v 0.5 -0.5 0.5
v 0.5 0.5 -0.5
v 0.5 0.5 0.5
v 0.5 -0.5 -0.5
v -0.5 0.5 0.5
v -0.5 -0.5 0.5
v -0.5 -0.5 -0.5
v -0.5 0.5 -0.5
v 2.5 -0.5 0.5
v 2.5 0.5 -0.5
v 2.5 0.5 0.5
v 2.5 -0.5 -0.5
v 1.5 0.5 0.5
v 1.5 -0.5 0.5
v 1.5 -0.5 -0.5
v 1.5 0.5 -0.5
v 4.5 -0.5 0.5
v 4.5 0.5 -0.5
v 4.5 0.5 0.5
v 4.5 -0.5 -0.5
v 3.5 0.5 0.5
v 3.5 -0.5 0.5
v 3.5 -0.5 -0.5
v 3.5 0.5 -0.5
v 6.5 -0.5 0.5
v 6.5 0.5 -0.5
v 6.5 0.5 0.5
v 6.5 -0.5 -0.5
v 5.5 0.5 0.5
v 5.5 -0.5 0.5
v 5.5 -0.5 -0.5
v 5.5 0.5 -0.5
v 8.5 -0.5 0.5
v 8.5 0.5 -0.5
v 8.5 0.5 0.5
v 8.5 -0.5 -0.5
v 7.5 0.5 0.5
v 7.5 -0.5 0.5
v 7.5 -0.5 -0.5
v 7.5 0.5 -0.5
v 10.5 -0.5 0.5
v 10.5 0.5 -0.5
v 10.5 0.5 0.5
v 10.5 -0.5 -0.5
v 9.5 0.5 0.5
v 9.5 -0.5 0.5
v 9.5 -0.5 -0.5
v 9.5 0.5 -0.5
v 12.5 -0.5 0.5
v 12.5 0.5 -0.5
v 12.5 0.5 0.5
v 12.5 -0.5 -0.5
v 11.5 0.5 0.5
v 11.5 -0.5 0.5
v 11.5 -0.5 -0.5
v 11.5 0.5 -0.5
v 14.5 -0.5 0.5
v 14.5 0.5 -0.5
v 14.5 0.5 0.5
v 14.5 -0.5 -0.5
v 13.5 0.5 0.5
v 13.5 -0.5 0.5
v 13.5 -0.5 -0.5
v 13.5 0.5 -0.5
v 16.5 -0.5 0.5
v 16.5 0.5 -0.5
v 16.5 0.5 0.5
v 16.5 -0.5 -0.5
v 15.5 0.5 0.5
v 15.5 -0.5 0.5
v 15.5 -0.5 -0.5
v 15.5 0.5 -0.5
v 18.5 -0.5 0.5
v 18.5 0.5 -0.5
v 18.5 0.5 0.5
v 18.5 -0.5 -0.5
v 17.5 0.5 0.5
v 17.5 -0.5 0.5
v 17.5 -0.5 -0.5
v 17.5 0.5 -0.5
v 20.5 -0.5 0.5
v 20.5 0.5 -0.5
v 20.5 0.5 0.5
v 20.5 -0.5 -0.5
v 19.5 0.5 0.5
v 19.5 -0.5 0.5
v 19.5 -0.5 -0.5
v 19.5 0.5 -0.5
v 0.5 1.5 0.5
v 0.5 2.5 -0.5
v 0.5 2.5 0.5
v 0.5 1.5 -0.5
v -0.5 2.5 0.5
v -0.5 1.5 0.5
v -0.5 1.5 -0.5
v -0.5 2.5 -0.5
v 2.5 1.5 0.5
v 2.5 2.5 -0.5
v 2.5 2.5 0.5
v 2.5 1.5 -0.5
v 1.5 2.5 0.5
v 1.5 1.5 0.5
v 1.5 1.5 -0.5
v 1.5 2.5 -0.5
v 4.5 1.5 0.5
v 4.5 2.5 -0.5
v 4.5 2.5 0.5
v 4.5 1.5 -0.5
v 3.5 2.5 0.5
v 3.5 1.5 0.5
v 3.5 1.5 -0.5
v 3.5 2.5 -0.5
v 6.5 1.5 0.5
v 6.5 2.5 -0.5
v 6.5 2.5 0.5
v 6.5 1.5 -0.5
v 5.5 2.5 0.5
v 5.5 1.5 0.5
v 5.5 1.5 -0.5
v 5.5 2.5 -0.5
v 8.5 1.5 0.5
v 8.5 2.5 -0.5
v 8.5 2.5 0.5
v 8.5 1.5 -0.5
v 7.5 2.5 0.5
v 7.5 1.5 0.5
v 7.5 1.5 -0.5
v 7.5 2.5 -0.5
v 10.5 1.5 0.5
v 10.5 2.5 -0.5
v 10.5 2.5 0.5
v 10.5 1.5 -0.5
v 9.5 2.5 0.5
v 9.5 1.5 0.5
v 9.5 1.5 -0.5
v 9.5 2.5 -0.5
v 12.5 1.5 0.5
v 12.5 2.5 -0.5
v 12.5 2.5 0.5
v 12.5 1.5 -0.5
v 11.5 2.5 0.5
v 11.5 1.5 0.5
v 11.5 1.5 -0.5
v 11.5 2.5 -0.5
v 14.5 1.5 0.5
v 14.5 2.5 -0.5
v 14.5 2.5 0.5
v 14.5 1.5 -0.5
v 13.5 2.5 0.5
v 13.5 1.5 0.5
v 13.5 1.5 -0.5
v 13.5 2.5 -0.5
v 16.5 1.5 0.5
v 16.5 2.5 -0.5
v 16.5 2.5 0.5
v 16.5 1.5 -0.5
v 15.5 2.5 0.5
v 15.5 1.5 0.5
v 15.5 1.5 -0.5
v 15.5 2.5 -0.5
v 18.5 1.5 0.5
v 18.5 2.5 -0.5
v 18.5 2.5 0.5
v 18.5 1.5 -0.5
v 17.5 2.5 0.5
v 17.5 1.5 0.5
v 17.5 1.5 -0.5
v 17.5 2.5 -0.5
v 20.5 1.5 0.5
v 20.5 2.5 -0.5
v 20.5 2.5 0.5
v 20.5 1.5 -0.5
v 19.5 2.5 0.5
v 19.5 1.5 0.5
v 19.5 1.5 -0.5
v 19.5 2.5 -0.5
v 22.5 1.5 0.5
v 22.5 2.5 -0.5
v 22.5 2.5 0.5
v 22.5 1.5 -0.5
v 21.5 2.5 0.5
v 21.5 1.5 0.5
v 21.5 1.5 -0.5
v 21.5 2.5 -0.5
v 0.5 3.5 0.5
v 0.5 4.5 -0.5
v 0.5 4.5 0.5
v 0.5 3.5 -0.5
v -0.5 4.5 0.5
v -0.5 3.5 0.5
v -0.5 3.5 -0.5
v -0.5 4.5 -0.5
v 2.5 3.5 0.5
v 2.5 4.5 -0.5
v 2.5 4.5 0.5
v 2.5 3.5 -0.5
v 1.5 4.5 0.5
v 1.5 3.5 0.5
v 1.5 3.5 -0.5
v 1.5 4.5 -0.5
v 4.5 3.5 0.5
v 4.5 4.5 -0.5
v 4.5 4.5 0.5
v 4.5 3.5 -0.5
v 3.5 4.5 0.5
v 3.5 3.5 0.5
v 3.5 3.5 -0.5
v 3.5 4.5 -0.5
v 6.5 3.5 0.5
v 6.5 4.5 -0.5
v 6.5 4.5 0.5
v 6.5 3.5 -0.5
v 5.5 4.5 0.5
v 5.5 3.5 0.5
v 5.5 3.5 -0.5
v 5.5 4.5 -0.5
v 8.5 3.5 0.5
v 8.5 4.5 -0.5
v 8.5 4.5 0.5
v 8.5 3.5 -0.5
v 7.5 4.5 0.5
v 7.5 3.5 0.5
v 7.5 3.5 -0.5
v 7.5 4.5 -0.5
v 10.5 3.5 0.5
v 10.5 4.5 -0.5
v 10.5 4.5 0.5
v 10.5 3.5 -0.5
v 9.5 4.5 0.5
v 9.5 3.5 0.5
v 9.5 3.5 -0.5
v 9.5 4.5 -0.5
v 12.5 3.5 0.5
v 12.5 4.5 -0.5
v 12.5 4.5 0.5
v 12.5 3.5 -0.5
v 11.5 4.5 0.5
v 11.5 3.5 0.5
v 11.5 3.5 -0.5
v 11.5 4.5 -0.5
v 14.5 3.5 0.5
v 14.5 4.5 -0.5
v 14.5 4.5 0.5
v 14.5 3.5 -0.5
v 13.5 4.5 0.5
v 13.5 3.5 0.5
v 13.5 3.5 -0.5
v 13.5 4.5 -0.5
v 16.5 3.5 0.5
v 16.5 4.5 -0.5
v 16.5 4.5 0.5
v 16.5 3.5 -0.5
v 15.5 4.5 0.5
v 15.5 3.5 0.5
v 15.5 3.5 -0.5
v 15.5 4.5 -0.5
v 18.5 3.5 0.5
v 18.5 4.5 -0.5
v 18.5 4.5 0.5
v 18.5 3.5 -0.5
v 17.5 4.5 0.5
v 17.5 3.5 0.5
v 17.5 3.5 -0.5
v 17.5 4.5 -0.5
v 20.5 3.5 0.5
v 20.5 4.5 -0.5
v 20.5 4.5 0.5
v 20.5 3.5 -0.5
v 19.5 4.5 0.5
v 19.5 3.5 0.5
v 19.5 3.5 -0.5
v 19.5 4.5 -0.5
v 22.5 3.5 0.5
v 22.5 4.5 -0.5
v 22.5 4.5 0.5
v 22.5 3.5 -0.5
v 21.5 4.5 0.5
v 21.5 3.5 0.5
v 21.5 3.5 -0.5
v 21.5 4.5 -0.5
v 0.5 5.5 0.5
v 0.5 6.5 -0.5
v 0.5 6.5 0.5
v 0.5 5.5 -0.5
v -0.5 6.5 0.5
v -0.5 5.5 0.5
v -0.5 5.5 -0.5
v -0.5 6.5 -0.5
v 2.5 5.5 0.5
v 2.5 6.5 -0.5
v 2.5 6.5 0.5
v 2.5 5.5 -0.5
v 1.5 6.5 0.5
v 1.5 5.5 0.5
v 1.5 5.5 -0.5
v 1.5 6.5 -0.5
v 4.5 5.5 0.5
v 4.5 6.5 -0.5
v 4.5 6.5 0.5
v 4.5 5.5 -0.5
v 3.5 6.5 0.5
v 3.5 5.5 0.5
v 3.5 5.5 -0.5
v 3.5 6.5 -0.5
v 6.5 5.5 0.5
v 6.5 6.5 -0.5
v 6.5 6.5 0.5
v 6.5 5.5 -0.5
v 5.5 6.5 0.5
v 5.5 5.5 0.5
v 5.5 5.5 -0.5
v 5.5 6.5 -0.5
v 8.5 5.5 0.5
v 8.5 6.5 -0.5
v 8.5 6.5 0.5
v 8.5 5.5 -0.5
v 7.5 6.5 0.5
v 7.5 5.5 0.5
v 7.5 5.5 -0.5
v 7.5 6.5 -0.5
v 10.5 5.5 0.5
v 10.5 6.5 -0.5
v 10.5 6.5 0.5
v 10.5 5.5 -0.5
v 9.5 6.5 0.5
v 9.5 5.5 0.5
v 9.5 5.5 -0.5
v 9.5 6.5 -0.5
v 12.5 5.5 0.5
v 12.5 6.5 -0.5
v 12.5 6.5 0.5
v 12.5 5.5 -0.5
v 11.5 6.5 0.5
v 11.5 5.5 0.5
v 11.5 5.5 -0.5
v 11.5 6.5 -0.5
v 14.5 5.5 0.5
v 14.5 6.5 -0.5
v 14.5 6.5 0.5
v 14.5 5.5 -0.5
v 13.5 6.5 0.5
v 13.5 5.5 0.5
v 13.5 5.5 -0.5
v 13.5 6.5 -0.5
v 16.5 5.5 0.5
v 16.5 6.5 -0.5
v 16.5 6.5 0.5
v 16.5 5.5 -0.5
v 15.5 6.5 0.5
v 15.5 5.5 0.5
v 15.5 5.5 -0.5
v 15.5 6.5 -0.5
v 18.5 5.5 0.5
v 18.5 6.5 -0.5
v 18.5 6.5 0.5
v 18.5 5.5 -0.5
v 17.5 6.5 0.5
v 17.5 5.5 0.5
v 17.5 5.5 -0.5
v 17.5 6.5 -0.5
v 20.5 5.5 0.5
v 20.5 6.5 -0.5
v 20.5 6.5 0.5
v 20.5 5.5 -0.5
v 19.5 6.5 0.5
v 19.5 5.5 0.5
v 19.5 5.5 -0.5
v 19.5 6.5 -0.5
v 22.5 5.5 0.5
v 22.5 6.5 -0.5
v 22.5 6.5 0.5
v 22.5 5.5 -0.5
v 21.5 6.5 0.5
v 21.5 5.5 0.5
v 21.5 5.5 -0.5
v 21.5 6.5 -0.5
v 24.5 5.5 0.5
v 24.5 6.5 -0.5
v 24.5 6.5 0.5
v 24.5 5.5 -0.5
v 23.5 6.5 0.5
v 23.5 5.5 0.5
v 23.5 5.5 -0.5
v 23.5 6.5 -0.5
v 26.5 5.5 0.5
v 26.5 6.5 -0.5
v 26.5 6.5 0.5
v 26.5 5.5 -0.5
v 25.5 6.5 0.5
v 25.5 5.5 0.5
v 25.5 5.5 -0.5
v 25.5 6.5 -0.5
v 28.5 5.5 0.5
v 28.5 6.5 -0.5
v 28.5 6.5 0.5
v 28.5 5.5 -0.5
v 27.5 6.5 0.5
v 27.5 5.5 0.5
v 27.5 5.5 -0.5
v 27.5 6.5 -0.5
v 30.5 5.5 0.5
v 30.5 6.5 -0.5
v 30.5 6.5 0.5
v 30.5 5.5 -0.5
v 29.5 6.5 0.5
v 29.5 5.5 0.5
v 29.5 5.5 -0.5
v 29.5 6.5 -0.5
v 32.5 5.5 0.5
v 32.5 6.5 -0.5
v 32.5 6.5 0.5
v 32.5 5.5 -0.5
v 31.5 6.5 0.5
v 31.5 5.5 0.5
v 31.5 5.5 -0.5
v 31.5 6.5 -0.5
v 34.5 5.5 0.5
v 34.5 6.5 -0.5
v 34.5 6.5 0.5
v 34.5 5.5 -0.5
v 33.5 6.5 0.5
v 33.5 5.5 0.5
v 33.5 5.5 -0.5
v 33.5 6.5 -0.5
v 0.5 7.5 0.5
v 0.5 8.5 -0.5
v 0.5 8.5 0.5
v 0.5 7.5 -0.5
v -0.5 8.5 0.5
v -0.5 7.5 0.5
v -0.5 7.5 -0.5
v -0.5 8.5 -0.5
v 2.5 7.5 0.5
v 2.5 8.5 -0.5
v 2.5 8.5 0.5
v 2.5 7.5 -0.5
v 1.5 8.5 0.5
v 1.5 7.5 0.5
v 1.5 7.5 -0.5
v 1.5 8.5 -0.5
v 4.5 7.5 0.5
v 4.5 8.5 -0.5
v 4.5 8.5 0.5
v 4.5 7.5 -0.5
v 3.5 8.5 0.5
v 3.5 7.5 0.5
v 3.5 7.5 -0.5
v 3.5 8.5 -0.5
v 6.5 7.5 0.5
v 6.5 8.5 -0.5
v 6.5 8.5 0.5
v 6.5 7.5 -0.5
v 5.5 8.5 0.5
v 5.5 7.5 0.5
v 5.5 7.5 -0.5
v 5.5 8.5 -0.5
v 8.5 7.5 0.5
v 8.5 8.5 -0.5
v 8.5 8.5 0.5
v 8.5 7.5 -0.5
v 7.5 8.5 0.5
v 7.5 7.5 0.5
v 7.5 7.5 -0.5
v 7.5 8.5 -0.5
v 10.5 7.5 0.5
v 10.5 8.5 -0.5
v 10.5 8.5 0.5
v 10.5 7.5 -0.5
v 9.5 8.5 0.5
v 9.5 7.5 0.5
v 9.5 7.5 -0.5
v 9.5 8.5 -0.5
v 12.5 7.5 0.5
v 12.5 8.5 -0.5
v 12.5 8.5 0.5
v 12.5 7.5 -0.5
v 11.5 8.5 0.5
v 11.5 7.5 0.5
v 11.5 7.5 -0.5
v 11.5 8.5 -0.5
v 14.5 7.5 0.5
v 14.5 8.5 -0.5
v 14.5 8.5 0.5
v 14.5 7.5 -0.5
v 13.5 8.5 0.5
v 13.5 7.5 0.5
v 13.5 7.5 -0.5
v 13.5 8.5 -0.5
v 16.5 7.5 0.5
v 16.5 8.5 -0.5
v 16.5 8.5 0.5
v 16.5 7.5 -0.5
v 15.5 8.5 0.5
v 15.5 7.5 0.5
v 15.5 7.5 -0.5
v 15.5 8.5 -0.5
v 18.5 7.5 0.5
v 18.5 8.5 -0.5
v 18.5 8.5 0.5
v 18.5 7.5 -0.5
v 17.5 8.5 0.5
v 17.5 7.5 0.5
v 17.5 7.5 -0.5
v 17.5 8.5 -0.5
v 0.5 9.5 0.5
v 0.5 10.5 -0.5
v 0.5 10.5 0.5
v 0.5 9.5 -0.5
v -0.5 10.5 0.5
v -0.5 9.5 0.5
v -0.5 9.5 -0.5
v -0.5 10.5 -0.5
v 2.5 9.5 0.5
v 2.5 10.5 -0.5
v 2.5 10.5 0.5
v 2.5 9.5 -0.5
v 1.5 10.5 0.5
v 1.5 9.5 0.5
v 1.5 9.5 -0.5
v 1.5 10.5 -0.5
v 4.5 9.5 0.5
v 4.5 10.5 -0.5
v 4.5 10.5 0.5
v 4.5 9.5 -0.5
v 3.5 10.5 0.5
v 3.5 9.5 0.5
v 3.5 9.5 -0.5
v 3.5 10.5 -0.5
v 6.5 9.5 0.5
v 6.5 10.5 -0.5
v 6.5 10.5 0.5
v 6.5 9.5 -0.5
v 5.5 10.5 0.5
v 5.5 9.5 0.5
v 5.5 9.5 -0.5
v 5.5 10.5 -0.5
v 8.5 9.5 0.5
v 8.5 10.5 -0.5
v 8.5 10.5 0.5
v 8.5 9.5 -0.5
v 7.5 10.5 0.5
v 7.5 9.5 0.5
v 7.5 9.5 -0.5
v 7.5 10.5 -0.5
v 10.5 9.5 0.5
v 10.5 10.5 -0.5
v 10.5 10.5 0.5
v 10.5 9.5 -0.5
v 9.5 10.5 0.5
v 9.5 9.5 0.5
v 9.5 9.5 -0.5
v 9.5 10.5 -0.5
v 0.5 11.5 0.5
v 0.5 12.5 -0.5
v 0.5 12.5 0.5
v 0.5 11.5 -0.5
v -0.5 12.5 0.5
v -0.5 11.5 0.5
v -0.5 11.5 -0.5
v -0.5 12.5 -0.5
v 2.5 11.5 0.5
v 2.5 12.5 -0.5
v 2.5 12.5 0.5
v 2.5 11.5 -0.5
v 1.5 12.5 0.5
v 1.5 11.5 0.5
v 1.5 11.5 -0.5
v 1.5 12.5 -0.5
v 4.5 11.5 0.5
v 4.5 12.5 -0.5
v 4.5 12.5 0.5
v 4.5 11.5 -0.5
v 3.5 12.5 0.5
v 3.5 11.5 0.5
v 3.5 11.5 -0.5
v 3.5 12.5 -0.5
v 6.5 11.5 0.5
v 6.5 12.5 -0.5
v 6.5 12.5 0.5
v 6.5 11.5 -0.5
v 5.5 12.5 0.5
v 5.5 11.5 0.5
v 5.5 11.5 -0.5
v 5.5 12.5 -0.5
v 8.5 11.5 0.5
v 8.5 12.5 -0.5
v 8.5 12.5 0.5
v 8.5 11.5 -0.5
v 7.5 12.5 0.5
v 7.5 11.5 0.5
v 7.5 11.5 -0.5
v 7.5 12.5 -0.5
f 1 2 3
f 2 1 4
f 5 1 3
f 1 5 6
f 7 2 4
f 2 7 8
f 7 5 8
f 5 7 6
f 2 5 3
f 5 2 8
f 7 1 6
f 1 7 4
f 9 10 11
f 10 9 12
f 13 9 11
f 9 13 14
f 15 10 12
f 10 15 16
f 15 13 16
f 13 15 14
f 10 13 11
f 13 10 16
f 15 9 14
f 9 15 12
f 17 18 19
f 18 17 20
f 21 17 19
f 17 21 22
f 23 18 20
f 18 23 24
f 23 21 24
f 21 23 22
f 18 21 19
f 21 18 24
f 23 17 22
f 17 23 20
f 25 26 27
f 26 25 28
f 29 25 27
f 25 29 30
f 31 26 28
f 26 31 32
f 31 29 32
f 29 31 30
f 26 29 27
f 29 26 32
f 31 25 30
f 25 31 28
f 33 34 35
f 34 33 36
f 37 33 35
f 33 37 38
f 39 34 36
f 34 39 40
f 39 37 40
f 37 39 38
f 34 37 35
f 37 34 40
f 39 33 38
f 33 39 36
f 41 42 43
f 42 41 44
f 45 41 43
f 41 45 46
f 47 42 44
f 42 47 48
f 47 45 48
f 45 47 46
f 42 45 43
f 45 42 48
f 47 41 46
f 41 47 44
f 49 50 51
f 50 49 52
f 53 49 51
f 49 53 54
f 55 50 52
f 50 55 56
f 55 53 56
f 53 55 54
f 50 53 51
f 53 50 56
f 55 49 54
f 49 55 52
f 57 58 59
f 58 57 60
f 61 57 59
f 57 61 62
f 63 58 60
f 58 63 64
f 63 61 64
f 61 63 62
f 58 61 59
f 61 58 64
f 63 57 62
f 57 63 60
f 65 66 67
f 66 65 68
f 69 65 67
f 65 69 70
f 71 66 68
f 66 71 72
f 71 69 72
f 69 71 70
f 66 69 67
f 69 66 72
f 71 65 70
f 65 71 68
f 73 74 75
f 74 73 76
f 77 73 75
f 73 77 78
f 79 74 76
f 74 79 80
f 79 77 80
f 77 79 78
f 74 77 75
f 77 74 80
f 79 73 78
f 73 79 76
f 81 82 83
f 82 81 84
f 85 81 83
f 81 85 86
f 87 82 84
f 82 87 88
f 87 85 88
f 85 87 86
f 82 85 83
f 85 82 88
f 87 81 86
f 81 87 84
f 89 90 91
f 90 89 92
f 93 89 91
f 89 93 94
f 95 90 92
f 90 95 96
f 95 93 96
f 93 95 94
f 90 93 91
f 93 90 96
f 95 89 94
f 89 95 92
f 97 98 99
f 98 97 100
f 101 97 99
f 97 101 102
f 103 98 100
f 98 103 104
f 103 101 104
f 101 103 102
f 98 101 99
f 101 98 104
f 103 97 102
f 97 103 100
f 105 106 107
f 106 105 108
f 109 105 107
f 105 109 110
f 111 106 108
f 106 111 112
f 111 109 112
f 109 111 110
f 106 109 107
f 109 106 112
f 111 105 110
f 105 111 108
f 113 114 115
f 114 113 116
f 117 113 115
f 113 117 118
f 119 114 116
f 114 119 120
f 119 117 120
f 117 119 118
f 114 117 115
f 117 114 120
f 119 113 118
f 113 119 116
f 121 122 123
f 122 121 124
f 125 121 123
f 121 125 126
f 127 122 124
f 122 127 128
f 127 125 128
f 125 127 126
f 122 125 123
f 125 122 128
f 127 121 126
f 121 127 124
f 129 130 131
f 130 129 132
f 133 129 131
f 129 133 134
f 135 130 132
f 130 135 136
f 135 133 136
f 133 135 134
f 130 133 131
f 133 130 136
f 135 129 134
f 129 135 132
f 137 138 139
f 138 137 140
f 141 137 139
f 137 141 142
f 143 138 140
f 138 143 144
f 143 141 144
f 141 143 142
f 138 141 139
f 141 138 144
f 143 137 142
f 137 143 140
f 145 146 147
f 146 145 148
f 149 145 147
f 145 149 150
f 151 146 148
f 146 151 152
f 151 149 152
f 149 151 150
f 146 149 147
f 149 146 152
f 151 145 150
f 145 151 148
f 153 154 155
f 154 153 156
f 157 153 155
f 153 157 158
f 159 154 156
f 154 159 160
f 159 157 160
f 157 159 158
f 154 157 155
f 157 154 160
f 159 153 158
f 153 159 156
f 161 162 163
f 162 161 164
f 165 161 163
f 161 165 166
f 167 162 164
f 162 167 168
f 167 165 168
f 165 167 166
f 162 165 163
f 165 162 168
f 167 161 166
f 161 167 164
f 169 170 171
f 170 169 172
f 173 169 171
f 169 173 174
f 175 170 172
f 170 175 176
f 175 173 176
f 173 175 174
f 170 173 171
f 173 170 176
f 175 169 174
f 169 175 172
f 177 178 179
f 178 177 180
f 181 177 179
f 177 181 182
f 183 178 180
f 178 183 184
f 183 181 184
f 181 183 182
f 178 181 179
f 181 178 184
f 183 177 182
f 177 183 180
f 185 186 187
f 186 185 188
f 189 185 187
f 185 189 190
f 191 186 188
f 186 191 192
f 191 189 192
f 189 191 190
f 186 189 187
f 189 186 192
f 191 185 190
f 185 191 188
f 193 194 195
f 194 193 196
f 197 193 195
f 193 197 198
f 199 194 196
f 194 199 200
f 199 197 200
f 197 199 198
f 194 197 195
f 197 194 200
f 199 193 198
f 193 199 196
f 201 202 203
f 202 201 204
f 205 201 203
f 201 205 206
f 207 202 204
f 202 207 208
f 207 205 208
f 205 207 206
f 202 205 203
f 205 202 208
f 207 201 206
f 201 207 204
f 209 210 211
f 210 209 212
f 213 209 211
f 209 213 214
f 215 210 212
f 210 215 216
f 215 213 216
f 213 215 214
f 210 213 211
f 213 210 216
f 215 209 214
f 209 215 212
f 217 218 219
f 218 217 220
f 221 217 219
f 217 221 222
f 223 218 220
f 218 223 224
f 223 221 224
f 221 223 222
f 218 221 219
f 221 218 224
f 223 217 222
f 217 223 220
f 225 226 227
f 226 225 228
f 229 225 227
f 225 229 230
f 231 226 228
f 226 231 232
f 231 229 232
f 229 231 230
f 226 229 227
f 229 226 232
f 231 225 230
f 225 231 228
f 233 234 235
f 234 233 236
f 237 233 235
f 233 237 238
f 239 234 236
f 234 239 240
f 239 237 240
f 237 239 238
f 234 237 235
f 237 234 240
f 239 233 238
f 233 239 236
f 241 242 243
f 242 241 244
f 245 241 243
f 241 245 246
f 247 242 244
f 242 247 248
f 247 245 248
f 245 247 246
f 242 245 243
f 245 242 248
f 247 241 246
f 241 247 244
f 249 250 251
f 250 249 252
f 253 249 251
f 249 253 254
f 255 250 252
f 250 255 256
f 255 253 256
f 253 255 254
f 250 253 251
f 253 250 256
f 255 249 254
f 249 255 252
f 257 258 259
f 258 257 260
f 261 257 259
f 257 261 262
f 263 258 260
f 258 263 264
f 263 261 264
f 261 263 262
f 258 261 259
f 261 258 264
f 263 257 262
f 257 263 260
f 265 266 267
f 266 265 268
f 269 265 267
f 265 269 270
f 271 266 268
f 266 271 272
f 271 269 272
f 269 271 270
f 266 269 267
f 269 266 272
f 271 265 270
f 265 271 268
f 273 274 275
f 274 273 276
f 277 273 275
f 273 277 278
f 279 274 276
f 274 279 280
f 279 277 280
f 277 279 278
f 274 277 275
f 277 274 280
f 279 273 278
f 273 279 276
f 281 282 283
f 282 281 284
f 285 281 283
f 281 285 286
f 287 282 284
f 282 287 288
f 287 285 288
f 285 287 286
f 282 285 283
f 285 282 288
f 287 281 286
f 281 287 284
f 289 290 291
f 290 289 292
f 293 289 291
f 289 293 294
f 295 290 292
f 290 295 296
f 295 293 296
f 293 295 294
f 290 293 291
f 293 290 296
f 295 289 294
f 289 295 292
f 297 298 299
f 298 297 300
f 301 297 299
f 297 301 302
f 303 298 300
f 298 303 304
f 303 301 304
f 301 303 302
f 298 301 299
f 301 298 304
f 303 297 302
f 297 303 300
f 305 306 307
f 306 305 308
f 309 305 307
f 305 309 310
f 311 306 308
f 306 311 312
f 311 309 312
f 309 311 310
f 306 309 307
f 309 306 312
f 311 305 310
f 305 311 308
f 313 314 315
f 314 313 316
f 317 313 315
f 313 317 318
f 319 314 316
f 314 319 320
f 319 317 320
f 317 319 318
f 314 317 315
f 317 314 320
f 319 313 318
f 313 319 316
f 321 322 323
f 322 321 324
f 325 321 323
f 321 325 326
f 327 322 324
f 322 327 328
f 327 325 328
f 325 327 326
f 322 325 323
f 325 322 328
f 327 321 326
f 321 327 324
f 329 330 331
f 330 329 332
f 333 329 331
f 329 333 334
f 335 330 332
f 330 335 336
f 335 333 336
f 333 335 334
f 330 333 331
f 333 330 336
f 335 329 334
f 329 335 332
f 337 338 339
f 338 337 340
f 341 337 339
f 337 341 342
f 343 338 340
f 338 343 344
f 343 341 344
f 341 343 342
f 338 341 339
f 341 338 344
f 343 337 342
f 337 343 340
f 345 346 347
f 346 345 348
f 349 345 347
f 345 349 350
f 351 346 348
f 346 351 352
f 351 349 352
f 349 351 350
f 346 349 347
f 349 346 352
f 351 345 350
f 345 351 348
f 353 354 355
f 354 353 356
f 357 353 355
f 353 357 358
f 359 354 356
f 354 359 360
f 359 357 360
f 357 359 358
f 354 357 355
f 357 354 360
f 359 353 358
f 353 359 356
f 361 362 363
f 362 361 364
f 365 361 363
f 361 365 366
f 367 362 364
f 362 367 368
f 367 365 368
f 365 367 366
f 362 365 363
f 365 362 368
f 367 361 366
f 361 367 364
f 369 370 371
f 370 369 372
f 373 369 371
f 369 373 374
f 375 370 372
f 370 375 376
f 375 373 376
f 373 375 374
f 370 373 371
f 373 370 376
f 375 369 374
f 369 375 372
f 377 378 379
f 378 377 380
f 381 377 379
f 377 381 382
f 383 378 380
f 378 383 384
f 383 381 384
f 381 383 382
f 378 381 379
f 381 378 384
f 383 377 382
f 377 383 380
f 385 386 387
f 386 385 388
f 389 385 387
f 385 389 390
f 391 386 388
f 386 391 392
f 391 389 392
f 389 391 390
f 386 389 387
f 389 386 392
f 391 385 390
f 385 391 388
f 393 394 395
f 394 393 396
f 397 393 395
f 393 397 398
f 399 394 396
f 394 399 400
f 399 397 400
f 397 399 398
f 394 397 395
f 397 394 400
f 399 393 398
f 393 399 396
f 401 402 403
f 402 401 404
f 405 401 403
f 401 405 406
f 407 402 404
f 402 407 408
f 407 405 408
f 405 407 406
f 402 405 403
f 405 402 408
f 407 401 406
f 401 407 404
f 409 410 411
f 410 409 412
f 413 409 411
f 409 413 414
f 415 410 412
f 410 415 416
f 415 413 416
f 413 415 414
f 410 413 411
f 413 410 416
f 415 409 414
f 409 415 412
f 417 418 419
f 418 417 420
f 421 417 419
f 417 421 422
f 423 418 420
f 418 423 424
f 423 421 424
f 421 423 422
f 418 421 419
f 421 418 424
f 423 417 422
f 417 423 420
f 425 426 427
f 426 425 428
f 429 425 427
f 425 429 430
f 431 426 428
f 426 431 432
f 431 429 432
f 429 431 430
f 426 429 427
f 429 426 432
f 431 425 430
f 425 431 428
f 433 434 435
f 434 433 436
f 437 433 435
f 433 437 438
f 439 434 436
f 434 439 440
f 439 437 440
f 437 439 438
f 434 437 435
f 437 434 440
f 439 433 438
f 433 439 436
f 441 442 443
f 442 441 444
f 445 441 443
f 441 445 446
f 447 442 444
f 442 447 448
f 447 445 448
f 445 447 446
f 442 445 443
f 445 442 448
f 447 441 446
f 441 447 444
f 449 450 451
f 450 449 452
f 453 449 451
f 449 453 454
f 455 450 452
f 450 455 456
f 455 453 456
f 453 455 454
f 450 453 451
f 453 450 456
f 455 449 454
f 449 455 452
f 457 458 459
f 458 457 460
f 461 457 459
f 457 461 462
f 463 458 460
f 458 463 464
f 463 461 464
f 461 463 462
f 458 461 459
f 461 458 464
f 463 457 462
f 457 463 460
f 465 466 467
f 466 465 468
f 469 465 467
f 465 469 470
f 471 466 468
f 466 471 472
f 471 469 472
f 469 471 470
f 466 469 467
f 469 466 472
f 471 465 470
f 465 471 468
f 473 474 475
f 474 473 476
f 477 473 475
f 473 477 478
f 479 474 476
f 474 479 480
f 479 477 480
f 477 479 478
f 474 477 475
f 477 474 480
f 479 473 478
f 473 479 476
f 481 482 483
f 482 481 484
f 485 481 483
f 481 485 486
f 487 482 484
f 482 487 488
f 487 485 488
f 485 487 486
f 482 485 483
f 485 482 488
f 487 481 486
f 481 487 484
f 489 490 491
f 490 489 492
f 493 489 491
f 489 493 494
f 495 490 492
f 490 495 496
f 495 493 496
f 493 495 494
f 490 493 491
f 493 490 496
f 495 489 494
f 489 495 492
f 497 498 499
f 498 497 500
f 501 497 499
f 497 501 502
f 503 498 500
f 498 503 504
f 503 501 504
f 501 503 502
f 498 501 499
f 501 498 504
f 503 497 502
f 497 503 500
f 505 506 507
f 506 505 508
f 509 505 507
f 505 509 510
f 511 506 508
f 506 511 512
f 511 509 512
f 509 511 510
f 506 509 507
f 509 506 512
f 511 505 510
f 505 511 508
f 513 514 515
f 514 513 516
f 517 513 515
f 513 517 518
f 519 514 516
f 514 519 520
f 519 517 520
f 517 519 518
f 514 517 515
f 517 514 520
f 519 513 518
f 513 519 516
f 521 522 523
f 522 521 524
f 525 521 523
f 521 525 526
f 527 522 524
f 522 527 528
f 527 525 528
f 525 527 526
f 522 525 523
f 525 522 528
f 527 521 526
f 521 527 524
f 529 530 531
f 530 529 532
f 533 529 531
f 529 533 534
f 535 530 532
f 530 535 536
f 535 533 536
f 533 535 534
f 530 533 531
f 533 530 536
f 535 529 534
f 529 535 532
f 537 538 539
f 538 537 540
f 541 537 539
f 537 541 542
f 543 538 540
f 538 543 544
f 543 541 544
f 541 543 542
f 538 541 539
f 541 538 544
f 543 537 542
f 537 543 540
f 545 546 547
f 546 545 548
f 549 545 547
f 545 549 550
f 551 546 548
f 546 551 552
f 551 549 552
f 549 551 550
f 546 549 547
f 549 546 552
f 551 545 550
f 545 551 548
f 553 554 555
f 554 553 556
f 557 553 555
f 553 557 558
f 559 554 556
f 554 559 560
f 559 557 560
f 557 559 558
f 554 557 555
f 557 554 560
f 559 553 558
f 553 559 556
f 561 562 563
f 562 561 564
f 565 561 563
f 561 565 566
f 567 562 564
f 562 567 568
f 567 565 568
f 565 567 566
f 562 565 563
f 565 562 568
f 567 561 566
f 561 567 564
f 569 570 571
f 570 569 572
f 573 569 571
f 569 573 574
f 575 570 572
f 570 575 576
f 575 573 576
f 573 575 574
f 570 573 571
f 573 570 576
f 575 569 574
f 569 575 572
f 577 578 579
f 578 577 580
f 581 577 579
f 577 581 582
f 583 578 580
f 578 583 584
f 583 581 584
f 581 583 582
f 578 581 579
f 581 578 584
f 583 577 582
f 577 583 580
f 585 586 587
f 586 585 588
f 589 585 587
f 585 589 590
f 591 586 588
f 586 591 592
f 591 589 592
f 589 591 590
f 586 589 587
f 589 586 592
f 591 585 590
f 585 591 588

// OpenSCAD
// file: Generic-Constants-Lib.scad
// Generic Constants  Library 
// filename "Generic-Constants-Lib.scad" version 0.01a
//
// see openscad/libraries/SCAD/Generic-Lib-Main.scad for guidelines 
//
//
//constants included in this file 
//-------------------------------
//
//group math constants
//	INCH
//	PI  
//group colors
//	basic colors 
//	ABS_<color name>
//	PLA_<color name>
//	ANODIZED_<color>
//	METAL_<type color name>	
//	WOOD_<type color name>
//	GLASS_<color>
//
//notes
//todo:-
//idealy the color values should of be picked from actual colour tables 
//rather than a close guess  
//

//group math constants

INCH = 25.4;
PI = 3.141592654;  

// group colors

// basic colors
RED = [1,0,0,1];
GREEN = [0,1,0,1];
BLUE = [0,0,1,1];
BLACK = [0,0,0,1];
ORANGE = [1,0.5,0,1];
PINK = [0.9,0.5,0.4,1];
PURPLE = [0.7,0,0.7,1];
GRAY = [0.5,0.5,0.5,1];
BROWN = [0.7,0.5,0,1];
YELLOW = [1,1,0,1];
VIOLET = [.7,0.3,1,1];

//group ABS_<colorname>
//	discription  common 3d printer ABS filament colors 
// actual colours may need some tweaking 

ABS_Nature =[0.8,0.8,0.8,0.8];
ABS_White =[0.9,0.9,0.9,1];
ABS_Black =[0.1,0.1,0.1,1];
ABS_Red = [0.7,0,0,1];
ABS_Green = [0,0.7,0,1];
ABS_Blue = [0,0,0.7,1];
ABS_Orange =[0.8,0.4,0,1];
ABS_Purple =[0.7,0,0.7,1];
ABS_Brown =[0.6,0.2,0.2,1];
ABS_Glow_Blue =[0,0,.99,1]; 
ABS_Flurescence_Green =[0,1,0,1];
ABS_Flurescence_Yellow = [0.9,0.9,0,1];

//group PLA_<colorname>
//	discription  common 3d printer PLA filament colors 
// actual colours may need some tweaking 

PLA_Nature =[0.8,0.8,0.8,0.8];
PLA_White =[0.9,0.9,0.9,1];
PLA_Black =[0.1,0.1,0.1,1];
PLA_Red = [0.7,0,0,1];
PLA_Green = [0,0.7,0,1];
PLA_Blue = [0,0,0.7,1];
PLA_Orange =[0.8,0.4,0,1];
PLA_Purple =[0.7,0,0.7,1];
PLA_Brown =[0.6,0.2,0.2,1];
PLA_Glow_Blue =[0,0,.99,1]; 
PLA_Flurescence_Green =[0,1,0,1];
PLA_Flurescence_Yellow = [0.9,0.9,0,1];

//group ANODIZED_<colorname>
//	discription  common aluminium anodized colors 
// these don't seem to follow normal color tables as the process
// produces a color change difference to the named color 
// dew to base metal 
// actual colours may need some tweaking 

ANODIZED_Red =[0.7,0,0,1];
ANODIZED_Gold =[0.8,0.8,0.0,1];
ANODIZED_Black =[0.1,0.1,0.1,1];
ANODIZED_Blue =[0,0,0.7,1];
ANODIZED_Green =[0,0.5,0,1];
ANODIZED_Gray =[0.4,0.4,0.4,1];
ANODIZED_Dark_Blue =[0,0.2,0.6,1];
ANODIZED_Lime_Green =[0,0.8,0,1];
ANODIZED_Purple =[0.5,0,0.7,1];		//more blue than purple
ANODIZED_Light_Blue =[0.4,0.4,1,1]; 
ANODIZED_Pink =[0.7,0,0.7,1];		//more purlpe than pink
ANODIZED_Orange =[0.9,0.5,0,1];
ANODIZED_Scandia_Gold =[0.9,0.6,0.3,1];
ANODIZED_Copper =[0.7,0.5,0,1];		//more brown than copper
ANODIZED_Clear =[0.7,0.7,0.9,1];	//natural aluminium color
ANODIZED_Light_Bronze =[0.4,0.4,0.3,1]; //more silver than bronze
ANODIZED_Gold_Nickel =[0.8,0.8,0.6,1];	
ANODIZED_Brush_Nickel =[0.8,0.8,0.7,1];

//group METAL_<typename>
//	discription common metal colors 
// colors need tweaking 
METAL_Aluminium = [0.7,0.7,0.9,1];
METAL_Brass = [0.88,0.78,0.5,1];
METAL_Copper = [0.9,0.6,0.5,1];
METAL_Steel = [0.9,0.9,0.8,1];
METAL_Stainless = [0.8,0.8,0.7,1];
METAL_Titanium = [0.7,0.7,0.6,1];
METAL_Bronze = [0.9,0.4,0.4,1];
METAL_Gold = [0.9,0.9,0.0,1];
METAL_Silver = [0.8,0.8,0.8,1];
METAL_Iron = [0.6,0.6,0.6,1];

// group WOOD_<typename>
//	discription common wood colors 
// probabaly wrong 
WOOD_Oak = [0.4,0.2,0.2,1];
WOOD_Birch = [0.8,0.8,0.4,1];
WOOD_Red = [0.7,0.3,0.3,1];
WOOD_pine = [0.8,0.8,0.4,1];
WOOD_Beach = [0.8,0.6,0.3,1];
WOOD_Spruce = [0.8,0.8,0.7,1];

// group GLASS_<color>
//	discription common glass colors 
// needs tweaking 
GLASS_Clear = [0.8,0.8,0.8,0.2];
GLASS_Red = [0.8,0,0,0.4];
GLASS_Green = [0,0.8,0,.4];
GLASS_Blue = [0,0,0.8,.4];
GLASS_Brown = [0.5,0.3,0.1,.4];

//end of file 
// file: Generic-Lib-Main.scad
/* OpenSCAD Proposed Extended Generic Base Library Functions
filename "Generic_lib_Main.scad" version 0.1a

 still work in progress so some functions may not be in there final form,
 compleate ,implimented and/or functional in its current state
 i suggest that this lib is not used other than for testing at the moment  

licencing see openscad/COPYING

discription 
	the lib is split into 4 main sub libs for easy managment 
 
	generic parts/materials h/w
		parts and materials and std size fittings and hardware
		
	extended shapes 
		extended shapes and objects 

	extended functions 
		extended trasformation and other related functions 

	generic global extended constants 
		constants and named varible values 

codeing guide 
when calling a module  the following var naming of the following native types are to be used  where applicable
 [x,y,z] 
 h = height
 r , r1 , r2  = radius
 d = diameter 
 center = true draws part centered on local [xyz]
      false draws part relative to its native refrance [xyz]
      on cylindrical parts this would be central on xy with z at one end  
 outline = true is draw as outline for "cutout" no clearnce!!
      false draws part as rendered

contant naming conventions 
	GROUP_Sub_Type

lib function naming convention to be used is Aaa_Aaa functions are also grouped M_metric_std_objects  I_imperal_std_opjects , C_custom_objects 


notes to remeber for modifying this lib 
remember to keep backwards compatabilaty when changing the Generic lib modules  

also remember the function module is no use without including appropriate documentation so that others may understand how to use it 
this means adding to the associated  lib documentation text file , as well as the quick lib referance text file 
*/

//proposed Default loaded Generic libs 
 
//include<Generic-Parts-Lib.scad>;     //TODO :in progress


//include<Generic-Shapes-Lib.scad>;    //TODO :in progress


//include<Generic-Function-Lib.scad>;  //TODO :in progress


include<Generic-Constants-Lib.scad>;  //v0.01a done
//test file Ggeneric-Constant_Test.scad v0.01a done 
//documentation file  TODO


//end of file
// main file
// lib test file constants  colours 

include<Generic-Lib-Main.scad>;

//generic colours
translate([0,0,0])color(RED)cube([1,1,1],center=true); 
translate([2,0,0])color(GREEN)cube([1,1,1],center=true);
translate([4,0,0])color(BLUE)cube([1,1,1],center=true);
translate([6,0,0])color(BLACK)cube([1,1,1],center=true);
translate([8,0,0])color(ORANGE)cube([1,1,1],center=true);
translate([10,0,0])color(PINK)cube([1,1,1],center=true);
translate([12,0,0])color(PURPLE)cube([1,1,1],center=true);
translate([14,0,0])color(GRAY)cube([1,1,1],center=true);
translate([16,0,0])color(BROWN)cube([1,1,1],center=true);
translate([18,0,0])color(YELLOW)cube([1,1,1],center=true);
translate([20,0,0])color(VIOLET)cube([1,1,1],center=true); 

//ABS colors
translate([0,2,0])color(ABS_Nature)cube([1,1,1],center=true);
translate([2,2,0])color(ABS_White)cube([1,1,1],center=true);
translate([4,2,0])color(ABS_Black)cube([1,1,1],center=true);
translate([6,2,0])color(ABS_Red)cube([1,1,1],center=true);
translate([8,2,0])color(ABS_Green)cube([1,1,1],center=true);
translate([10,2,0])color(ABS_Blue)cube([1,1,1],center=true);
translate([12,2,0])color(ABS_Orange)cube([1,1,1],center=true);
translate([14,2,0])color(ABS_Purple)cube([1,1,1],center=true);
translate([16,2,0])color(ABS_Brown)cube([1,1,1],center=true);
translate([18,2,0])color(ABS_Glow_Blue)cube([1,1,1],center=true);
translate([20,2,0])color(ABS_Flurescence_Green)cube([1,1,1],center=true);
translate([22,2,0])color(ABS_Flurescence_Yellow)cube([1,1,1],center=true);

//PLA colors
translate([0,4,0])color(PLA_Nature)cube([1,1,1],center=true);
translate([2,4,0])color(PLA_White)cube([1,1,1],center=true);
translate([4,4,0])color(PLA_Black)cube([1,1,1],center=true);
translate([6,4,0])color(PLA_Red)cube([1,1,1],center=true);
translate([8,4,0])color(PLA_Green)cube([1,1,1],center=true);
translate([10,4,0])color(PLA_Blue)cube([1,1,1],center=true);
translate([12,4,0])color(PLA_Orange)cube([1,1,1],center=true);
translate([14,4,0])color(PLA_Purple)cube([1,1,1],center=true);
translate([16,4,0])color(PLA_Brown)cube([1,1,1],center=true);
translate([18,4,0])color(PLA_Glow_Blue)cube([1,1,1],center=true);
translate([20,4,0])color(PLA_Flurescence_Green)cube([1,1,1],center=true);
translate([22,4,0])color(PLA_Flurescence_Yellow)cube([1,1,1],center=true);

//ANODIZED colors 
//note (dew to base metal (aluminium) anodized colours differ from sandard color sets )
translate([0,6,0])color(ANODIZED_Red)cube([1,1,1],center=true);
translate([2,6,0])color(ANODIZED_Gold)cube([1,1,1],center=true);
translate([4,6,0])color(ANODIZED_Black)cube([1,1,1],center=true);
translate([6,6,0])color(ANODIZED_Blue)cube([1,1,1],center=true);
translate([8,6,0])color(ANODIZED_Green)cube([1,1,1],center=true);
translate([10,6,0])color(ANODIZED_Gray)cube([1,1,1],center=true);
translate([12,6,0])color(ANODIZED_Dark_Blue)cube([1,1,1],center=true);
translate([14,6,0])color(ANODIZED_Lime_Green)cube([1,1,1],center=true);
translate([16,6,0])color(ANODIZED_Purple)cube([1,1,1],center=true);
translate([18,6,0])color(ANODIZED_Light_Blue)cube([1,1,1],center=true); 
translate([20,6,0])color(ANODIZED_Pink)cube([1,1,1],center=true);
translate([22,6,0])color(ANODIZED_Orange)cube([1,1,1],center=true);
translate([24,6,0])color(ANODIZED_Scandia_Gold)cube([1,1,1],center=true);
translate([26,6,0])color(ANODIZED_Copper)cube([1,1,1],center=true); 
translate([28,6,0])color(ANODIZED_Clear)cube([1,1,1],center=true); 
translate([30,6,0])color(ANODIZED_Light_Bronze)cube([1,1,1],center=true);
translate([32,6,0])color(ANODIZED_Gold_Nickel)cube([1,1,1],center=true);
translate([34,6,0])color(ANODIZED_Brush_Nickel)cube([1,1,1],center=true);

//group METAL colors
translate([0,8,0])color(METAL_Aluminium)cube([1,1,1],center=true); 
translate([2,8,0])color(METAL_Brass)cube([1,1,1],center=true);
translate([4,8,0])color(METAL_Copper)cube([1,1,1],center=true);
translate([6,8,0])color(METAL_Steel)cube([1,1,1],center=true);
translate([8,8,0])color(METAL_Stainless)cube([1,1,1],center=true); 
translate([10,8,0])color(METAL_Titanium)cube([1,1,1],center=true);
translate([12,8,0])color(METAL_Bronze)cube([1,1,1],center=true);
translate([14,8,0])color(METAL_Gold)cube([1,1,1],center=true);
translate([16,8,0])color(METAL_Silver)cube([1,1,1],center=true); 
translate([18,8,0])color(METAL_Iron)cube([1,1,1],center=true);

// group WOOD colors
translate([0,10,0])color(WOOD_Oak)cube([1,1,1],center=true); 
translate([2,10,0])color(WOOD_Birch)cube([1,1,1],center=true); 
translate([4,10,0])color(WOOD_Red)cube([1,1,1],center=true); 
translate([6,10,0])color(WOOD_pine)cube([1,1,1],center=true);  
translate([8,10,0])color(WOOD_Beach)cube([1,1,1],center=true);  
translate([10,10,0])color(WOOD_Spruce)cube([1,1,1],center=true);  

// group GLASS colors
translate([0,12,0])color(GLASS_Clear)cube([1,1,1],center=true);  
translate([2,12,0])color(GLASS_Red)cube([1,1,1],center=true);  
translate([4,12,0])color(GLASS_Green)cube([1,1,1],center=true);  
translate([6,12,0])color(GLASS_Blue)cube([1,1,1],center=true);  
translate([8,12,0])color(GLASS_Brown)cube([1,1,1],center=true);  

//end of file 
